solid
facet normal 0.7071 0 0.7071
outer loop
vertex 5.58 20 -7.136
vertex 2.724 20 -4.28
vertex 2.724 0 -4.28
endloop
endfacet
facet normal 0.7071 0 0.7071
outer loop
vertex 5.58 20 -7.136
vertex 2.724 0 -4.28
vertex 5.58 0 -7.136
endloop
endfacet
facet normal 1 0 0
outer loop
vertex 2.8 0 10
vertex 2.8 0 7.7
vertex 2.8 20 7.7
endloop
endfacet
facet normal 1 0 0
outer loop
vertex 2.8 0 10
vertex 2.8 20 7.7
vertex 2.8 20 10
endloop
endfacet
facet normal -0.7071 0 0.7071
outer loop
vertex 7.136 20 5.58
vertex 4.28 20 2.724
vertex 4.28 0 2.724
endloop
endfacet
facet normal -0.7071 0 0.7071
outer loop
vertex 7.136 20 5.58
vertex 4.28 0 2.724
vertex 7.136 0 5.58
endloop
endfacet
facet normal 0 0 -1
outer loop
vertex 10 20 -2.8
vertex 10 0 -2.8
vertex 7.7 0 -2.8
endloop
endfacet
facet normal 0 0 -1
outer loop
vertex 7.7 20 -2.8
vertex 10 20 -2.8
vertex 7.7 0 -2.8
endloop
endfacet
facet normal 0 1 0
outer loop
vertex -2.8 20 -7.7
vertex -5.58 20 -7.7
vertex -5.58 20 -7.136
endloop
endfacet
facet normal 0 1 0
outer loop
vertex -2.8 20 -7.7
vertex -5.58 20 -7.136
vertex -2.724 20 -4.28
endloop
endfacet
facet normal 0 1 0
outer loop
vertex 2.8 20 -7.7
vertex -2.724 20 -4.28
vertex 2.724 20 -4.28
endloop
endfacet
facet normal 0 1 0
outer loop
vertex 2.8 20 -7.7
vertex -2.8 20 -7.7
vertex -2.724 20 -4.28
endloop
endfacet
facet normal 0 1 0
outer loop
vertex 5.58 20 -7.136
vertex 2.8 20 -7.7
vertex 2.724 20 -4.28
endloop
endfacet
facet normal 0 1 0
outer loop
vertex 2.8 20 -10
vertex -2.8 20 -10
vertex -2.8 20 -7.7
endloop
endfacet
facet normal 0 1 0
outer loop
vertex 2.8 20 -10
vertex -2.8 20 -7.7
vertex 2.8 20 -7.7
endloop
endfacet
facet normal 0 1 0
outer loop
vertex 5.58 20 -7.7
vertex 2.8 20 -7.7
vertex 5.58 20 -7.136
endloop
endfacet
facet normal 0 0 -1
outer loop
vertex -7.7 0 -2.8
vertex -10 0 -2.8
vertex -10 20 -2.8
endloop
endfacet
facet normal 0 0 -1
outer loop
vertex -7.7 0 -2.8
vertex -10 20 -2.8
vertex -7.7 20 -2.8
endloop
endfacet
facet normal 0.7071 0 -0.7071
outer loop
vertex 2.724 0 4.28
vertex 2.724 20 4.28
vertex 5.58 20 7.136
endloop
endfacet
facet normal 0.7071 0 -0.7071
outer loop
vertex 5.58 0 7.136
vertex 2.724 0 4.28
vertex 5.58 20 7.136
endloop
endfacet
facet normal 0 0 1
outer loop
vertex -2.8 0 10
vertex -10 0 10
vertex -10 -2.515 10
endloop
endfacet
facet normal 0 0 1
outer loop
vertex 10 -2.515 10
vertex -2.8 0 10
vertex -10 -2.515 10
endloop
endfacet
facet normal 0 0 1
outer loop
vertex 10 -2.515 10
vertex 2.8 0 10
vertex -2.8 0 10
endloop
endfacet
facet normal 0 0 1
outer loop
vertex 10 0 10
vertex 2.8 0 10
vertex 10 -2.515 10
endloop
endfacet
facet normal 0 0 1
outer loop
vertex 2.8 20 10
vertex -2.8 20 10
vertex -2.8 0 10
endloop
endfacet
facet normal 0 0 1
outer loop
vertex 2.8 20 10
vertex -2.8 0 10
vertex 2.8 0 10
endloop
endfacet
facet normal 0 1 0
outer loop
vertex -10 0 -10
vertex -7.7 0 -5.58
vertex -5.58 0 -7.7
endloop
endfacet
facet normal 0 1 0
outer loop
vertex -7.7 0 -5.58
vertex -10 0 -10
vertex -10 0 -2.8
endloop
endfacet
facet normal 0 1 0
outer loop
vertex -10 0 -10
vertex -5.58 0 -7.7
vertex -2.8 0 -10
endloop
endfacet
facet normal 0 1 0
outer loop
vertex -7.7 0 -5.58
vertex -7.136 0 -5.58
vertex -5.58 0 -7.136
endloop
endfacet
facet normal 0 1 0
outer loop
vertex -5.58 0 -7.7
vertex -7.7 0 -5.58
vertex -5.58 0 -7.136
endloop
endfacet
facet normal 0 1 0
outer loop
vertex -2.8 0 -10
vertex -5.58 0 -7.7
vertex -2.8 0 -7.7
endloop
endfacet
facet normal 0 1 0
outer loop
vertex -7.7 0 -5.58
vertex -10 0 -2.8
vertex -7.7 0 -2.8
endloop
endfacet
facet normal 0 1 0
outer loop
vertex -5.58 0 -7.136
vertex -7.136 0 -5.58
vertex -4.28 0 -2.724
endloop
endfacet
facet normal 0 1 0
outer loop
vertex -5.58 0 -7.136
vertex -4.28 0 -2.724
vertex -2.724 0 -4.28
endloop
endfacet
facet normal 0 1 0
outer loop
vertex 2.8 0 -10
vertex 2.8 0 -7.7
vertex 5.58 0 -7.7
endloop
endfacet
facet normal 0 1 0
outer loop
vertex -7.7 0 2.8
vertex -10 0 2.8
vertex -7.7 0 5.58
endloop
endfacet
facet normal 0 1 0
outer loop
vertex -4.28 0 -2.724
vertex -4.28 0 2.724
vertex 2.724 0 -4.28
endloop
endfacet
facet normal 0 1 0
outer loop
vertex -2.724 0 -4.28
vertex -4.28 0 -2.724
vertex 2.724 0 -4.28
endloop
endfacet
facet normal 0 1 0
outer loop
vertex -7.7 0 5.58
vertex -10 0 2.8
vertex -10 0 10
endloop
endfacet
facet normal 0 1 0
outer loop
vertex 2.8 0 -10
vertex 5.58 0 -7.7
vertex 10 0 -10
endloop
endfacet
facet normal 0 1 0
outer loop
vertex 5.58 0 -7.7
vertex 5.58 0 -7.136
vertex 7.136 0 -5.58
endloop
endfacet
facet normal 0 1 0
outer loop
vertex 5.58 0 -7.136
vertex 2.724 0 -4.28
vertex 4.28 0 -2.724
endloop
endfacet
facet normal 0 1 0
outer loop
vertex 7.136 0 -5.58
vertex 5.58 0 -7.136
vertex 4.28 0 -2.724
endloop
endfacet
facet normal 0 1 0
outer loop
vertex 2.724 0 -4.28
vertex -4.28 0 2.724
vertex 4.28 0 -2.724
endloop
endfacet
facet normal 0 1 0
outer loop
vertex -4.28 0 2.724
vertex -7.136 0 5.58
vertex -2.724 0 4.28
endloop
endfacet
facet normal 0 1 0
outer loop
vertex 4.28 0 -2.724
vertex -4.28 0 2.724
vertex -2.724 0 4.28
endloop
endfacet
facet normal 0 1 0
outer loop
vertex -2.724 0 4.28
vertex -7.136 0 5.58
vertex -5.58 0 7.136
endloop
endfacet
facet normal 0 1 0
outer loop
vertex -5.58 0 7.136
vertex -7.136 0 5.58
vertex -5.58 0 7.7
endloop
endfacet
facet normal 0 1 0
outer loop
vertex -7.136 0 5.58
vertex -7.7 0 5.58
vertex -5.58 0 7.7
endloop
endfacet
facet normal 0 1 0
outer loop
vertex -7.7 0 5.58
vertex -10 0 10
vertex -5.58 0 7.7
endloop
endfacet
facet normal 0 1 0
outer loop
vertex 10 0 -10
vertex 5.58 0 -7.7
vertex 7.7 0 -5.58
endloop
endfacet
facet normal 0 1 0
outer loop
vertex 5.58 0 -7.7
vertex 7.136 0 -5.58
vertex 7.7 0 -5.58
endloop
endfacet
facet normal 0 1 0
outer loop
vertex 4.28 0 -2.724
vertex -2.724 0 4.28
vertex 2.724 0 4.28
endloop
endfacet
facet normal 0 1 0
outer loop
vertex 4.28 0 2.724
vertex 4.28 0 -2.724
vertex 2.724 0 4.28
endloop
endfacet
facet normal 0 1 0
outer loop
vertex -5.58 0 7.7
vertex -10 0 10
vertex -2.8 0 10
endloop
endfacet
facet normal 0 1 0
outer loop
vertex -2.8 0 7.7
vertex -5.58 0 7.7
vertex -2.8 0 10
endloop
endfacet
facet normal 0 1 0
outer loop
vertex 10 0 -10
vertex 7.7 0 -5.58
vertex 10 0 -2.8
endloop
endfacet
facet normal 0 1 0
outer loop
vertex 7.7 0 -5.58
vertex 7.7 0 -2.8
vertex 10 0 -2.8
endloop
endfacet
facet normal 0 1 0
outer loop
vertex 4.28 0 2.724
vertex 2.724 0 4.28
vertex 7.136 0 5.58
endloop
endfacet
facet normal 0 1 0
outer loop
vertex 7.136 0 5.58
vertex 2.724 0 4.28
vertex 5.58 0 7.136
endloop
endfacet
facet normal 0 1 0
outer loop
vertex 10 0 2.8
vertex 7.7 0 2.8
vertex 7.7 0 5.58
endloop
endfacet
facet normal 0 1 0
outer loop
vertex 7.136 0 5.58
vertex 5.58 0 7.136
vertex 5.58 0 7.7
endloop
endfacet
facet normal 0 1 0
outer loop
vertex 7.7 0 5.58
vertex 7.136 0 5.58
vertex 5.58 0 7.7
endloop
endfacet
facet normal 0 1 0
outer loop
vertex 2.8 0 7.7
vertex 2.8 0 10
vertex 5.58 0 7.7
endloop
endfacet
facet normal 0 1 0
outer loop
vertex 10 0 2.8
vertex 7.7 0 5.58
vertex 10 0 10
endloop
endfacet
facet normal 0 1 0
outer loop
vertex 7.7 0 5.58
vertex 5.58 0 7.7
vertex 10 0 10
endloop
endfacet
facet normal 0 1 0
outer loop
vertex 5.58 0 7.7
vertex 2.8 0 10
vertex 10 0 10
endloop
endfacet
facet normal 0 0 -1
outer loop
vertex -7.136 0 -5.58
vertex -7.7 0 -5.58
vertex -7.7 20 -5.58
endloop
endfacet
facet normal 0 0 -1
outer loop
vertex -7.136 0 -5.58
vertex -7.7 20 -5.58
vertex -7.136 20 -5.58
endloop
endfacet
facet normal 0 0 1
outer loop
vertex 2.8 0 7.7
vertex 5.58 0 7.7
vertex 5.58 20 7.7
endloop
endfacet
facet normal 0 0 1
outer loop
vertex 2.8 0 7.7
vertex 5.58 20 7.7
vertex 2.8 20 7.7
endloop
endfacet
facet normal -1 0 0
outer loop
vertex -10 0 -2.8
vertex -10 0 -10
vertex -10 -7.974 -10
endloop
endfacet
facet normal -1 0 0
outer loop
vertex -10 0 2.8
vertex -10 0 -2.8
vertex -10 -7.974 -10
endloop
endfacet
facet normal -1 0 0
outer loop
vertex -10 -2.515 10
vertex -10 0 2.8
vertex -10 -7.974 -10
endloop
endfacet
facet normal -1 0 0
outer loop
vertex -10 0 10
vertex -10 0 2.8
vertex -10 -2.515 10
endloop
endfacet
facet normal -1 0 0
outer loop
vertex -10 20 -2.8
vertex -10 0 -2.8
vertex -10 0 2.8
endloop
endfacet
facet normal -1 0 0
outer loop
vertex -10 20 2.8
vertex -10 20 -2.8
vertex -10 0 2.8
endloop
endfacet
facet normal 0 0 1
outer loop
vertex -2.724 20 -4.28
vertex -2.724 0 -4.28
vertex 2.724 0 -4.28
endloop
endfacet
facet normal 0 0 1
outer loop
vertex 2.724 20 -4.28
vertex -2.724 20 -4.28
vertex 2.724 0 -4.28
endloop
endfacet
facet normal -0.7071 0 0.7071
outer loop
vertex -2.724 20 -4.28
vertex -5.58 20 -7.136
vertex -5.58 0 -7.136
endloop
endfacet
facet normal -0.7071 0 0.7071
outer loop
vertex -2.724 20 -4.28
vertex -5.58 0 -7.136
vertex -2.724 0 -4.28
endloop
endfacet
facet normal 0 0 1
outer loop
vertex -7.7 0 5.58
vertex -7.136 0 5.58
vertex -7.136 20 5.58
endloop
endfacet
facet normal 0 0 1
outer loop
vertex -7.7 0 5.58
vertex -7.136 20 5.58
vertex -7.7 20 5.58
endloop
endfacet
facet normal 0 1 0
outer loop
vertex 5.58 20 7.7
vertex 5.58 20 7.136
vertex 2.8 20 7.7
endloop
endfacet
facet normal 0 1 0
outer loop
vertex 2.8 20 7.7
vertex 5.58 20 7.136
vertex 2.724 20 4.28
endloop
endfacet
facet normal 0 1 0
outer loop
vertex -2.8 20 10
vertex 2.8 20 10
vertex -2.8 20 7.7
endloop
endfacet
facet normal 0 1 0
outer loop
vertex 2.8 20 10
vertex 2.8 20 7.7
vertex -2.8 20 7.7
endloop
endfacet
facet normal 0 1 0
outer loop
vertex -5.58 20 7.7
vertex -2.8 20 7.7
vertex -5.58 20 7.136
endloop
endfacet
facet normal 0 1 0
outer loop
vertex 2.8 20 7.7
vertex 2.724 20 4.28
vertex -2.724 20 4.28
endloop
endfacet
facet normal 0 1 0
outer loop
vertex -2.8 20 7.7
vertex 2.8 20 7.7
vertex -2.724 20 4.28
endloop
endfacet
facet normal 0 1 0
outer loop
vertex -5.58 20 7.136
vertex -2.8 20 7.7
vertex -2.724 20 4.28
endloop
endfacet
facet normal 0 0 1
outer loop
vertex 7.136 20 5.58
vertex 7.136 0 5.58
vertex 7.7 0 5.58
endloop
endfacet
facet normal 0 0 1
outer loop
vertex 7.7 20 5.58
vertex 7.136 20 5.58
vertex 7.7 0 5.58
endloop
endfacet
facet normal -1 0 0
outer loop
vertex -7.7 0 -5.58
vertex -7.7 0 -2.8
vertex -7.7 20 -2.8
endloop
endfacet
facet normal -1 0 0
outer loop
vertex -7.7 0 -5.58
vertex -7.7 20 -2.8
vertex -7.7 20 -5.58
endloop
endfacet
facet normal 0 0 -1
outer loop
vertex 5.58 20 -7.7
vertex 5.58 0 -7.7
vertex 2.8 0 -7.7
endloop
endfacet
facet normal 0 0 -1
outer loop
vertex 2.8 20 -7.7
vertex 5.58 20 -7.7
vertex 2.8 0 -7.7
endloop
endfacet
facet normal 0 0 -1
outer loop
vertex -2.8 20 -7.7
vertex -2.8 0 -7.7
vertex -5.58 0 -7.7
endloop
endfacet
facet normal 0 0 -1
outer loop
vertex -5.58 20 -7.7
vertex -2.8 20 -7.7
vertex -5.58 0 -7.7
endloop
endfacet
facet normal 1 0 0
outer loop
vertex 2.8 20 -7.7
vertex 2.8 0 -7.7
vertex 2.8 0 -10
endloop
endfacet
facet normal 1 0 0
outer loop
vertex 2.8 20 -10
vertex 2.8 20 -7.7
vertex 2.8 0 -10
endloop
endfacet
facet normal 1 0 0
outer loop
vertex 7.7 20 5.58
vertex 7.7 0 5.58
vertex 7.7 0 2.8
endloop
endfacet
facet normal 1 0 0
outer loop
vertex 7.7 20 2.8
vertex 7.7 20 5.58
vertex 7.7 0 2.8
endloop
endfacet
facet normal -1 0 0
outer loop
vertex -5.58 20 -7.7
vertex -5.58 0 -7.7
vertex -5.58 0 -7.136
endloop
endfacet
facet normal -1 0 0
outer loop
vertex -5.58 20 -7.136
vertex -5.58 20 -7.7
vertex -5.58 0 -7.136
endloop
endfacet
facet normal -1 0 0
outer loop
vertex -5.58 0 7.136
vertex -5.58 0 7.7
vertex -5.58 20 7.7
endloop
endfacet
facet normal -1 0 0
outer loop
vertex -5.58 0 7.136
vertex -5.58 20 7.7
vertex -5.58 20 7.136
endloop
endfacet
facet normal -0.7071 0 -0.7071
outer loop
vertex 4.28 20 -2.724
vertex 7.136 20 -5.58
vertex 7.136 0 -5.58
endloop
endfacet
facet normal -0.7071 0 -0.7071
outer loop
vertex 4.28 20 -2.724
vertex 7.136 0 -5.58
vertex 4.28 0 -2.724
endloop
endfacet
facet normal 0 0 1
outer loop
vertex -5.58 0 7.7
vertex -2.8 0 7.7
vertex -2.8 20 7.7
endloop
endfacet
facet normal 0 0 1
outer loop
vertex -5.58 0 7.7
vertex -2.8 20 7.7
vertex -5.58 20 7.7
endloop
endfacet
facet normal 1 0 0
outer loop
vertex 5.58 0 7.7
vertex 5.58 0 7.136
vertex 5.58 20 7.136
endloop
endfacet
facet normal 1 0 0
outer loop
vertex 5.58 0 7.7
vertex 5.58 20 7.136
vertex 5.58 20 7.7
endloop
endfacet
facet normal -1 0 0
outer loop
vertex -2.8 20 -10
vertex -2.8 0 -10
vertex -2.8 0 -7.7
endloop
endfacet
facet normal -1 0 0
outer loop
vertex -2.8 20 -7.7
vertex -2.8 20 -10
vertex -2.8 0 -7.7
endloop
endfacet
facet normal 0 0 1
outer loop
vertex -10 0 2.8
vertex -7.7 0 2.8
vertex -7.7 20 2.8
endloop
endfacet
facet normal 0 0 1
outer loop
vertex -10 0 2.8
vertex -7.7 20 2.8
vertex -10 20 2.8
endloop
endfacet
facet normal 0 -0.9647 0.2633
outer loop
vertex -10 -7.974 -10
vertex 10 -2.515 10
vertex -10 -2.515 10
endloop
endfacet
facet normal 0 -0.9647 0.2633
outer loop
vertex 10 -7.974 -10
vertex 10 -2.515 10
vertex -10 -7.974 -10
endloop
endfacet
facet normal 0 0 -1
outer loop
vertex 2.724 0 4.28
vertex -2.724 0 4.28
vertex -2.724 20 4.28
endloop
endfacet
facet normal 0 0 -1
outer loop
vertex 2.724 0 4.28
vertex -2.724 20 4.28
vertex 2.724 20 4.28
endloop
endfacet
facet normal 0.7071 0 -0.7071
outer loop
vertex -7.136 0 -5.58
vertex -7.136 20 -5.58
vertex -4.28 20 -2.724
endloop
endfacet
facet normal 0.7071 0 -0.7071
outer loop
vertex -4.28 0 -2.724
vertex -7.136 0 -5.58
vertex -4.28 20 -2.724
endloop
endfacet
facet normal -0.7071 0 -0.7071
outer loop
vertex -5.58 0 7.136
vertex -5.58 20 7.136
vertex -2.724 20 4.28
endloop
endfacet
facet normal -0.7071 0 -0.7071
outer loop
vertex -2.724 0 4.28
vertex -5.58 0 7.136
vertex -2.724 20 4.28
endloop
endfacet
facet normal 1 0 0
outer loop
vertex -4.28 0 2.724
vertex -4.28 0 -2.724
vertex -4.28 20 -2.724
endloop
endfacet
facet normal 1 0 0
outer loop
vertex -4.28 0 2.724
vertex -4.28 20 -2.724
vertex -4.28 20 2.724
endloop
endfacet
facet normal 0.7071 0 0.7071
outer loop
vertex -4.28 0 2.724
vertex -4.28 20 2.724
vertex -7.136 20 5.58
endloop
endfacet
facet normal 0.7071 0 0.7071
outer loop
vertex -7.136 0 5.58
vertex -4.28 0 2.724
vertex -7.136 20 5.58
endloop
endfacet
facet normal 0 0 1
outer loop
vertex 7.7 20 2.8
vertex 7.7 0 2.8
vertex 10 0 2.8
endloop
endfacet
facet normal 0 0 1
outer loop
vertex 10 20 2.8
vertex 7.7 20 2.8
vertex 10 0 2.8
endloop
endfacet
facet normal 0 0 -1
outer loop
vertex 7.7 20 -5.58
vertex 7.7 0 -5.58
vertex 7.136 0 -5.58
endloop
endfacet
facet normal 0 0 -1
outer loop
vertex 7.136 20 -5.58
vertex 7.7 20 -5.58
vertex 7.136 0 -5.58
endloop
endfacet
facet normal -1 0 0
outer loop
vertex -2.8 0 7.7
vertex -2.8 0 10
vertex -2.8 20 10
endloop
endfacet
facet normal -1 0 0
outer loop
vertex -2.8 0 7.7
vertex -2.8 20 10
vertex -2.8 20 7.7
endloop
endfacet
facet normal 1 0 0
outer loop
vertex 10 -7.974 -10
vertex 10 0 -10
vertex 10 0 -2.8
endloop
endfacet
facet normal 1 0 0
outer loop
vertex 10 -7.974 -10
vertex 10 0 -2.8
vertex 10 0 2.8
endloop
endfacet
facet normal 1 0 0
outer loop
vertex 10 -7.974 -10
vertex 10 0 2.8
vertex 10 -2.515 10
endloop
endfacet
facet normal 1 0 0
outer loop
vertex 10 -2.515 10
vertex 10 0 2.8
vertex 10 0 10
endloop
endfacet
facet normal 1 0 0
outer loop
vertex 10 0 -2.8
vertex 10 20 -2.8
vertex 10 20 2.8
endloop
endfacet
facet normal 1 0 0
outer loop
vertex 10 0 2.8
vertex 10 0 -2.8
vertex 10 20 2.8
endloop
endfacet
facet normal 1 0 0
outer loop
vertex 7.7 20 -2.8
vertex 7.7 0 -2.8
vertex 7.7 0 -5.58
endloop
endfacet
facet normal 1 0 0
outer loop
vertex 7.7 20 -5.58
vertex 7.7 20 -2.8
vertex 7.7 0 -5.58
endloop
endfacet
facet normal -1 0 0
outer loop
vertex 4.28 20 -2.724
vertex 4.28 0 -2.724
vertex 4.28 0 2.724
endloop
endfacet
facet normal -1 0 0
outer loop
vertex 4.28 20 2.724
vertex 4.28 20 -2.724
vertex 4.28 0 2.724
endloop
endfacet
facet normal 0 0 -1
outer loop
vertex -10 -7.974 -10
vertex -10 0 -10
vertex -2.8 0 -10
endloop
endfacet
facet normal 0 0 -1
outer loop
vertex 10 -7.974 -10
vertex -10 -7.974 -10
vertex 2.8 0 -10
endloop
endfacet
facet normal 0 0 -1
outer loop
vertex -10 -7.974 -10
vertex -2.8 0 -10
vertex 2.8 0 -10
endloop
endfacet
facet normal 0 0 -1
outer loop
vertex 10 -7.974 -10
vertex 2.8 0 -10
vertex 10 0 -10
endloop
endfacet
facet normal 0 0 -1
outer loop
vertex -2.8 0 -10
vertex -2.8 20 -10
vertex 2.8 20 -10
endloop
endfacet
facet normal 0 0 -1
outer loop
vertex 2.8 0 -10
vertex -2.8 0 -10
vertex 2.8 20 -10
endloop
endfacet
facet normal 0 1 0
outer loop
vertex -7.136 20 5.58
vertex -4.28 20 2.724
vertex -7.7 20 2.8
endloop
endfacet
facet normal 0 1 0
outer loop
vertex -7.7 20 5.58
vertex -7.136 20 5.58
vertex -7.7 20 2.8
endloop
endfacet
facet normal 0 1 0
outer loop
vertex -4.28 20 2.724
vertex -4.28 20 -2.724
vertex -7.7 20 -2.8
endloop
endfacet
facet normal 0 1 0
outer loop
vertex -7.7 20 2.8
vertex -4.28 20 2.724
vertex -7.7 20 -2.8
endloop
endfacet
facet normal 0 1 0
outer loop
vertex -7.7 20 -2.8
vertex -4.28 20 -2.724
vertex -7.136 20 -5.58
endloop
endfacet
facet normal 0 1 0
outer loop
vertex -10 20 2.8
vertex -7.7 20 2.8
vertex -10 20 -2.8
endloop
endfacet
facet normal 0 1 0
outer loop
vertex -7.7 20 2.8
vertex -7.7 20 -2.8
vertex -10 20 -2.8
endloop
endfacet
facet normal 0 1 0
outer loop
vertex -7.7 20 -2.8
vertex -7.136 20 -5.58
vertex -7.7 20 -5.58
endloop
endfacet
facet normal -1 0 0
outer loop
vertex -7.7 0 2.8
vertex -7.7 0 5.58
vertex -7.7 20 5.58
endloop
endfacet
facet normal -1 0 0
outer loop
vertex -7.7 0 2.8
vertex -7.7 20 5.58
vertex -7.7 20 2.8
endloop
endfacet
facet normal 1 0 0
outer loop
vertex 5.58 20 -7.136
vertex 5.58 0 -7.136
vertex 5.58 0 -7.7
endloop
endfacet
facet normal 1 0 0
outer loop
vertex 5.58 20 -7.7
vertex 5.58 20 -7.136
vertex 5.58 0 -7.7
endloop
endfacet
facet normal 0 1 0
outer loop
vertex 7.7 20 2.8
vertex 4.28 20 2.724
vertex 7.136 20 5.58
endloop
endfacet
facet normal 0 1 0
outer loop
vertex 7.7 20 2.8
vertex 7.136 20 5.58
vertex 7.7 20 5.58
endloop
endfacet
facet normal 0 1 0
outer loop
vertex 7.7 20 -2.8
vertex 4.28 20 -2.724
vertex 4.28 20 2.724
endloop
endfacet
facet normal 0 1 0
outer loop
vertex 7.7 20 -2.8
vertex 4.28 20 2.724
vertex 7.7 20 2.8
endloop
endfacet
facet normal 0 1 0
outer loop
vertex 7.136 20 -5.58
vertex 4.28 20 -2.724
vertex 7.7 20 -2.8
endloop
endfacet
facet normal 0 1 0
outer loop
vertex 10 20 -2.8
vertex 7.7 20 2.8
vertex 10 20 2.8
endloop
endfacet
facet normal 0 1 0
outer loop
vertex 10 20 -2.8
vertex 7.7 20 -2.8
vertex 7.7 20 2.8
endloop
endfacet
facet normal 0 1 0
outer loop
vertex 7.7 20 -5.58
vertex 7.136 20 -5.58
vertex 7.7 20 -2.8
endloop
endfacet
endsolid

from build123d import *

# Parameters (mm, degrees)
BOSS_EXTRUDE1_DEPTH   = 20
BOSS_EXTRUDE1_2_DEPTH = 20
BOSS_EXTRUDE1_3_DEPTH = 20
BOSS_EXTRUDE1_4_DEPTH = 20
SKETCH2_W             = 20
SKETCH2_H             = 20
BOSS_EXTRUDE2_DEPTH   = 20
CUT_EXTRUDE1_DEPTH    = 31


with BuildPart() as part:
    # Sketch1 → Boss-Extrude1 (new body)
    with BuildSketch(Plane(origin=(0, 0, 0), x_dir=(1, 0, 0), z_dir=(0, 1, 0))):
        Polygon((-10, -2.8), (-10, 2.8), (-7.7, 2.8), (-7.7, 5.58), (-7.135634919, 5.58), (-4.28, 2.724365081), (-4.28, -2.724365081), (-7.135634919, -5.58), (-7.7, -5.58), (-7.7, -2.8), align=None)
    extrude(amount=BOSS_EXTRUDE1_DEPTH)



with BuildPart() as body_2:
    # Sketch1 → Boss-Extrude1 2 (new body)
    with BuildSketch(Plane(origin=(0, 0, 0), x_dir=(1, 0, 0), z_dir=(0, 1, 0))):
        Polygon((10, 2.8), (7.7, 2.8), (7.7, 5.58), (7.135634919, 5.58), (4.28, 2.724365081), (4.28, -2.724365081), (7.135634919, -5.58), (7.7, -5.58), (7.7, -2.8), (10, -2.8), align=None)
    extrude(amount=BOSS_EXTRUDE1_2_DEPTH)


with BuildPart() as body_3:
    # Sketch1 → Boss-Extrude1 3 (new body)
    with BuildSketch(Plane(origin=(0, 0, 0), x_dir=(1, 0, 0), z_dir=(0, 1, 0))):
        Polygon((2.8, -10), (-2.8, -10), (-2.8, -7.7), (-5.58, -7.7), (-5.58, -7.135634919), (-2.724365081, -4.28), (2.724365081, -4.28), (5.58, -7.135634919), (5.58, -7.7), (2.8, -7.7), align=None)
    extrude(amount=BOSS_EXTRUDE1_3_DEPTH)


with BuildPart() as body_4:
    # Sketch1 → Boss-Extrude1 4 (new body)
    with BuildSketch(Plane(origin=(0, 0, 0), x_dir=(1, 0, 0), z_dir=(0, 1, 0))):
        Polygon((-2.8, 10), (-2.8, 7.7), (-5.58, 7.7), (-5.58, 7.135634919), (-2.724365081, 4.28), (2.724365081, 4.28), (5.58, 7.135634919), (5.58, 7.7), (2.8, 7.7), (2.8, 10), align=None)
    extrude(amount=BOSS_EXTRUDE1_4_DEPTH)


with BuildPart() as part_1:
    add(part.part)

    add(body_2.part)  # Boss-Extrude2 merges body 2

    add(body_3.part)  # Boss-Extrude2 merges body 3

    add(body_4.part)  # Boss-Extrude2 merges body 4
    # Sketch2 → Boss-Extrude2 (add)
    with BuildSketch(Plane.XZ):
        Rectangle(SKETCH2_W, SKETCH2_H)
    extrude(amount=BOSS_EXTRUDE2_DEPTH)

    # Sketch3 → Cut-Extrude1 (cut, through all)
    with BuildSketch(Plane(origin=(10, 0, 0), x_dir=(0, 0, -1), z_dir=(1, 0, 0))):
        Polygon((10.596673941, -8.137212268), (10.596673941, -38.345549702), (-10.411138478, -38.345549702), (-10.411138478, -2.402671747), align=None)
    extrude(amount=-CUT_EXTRUDE1_DEPTH, mode=Mode.SUBTRACT)


solid = part_1.part
